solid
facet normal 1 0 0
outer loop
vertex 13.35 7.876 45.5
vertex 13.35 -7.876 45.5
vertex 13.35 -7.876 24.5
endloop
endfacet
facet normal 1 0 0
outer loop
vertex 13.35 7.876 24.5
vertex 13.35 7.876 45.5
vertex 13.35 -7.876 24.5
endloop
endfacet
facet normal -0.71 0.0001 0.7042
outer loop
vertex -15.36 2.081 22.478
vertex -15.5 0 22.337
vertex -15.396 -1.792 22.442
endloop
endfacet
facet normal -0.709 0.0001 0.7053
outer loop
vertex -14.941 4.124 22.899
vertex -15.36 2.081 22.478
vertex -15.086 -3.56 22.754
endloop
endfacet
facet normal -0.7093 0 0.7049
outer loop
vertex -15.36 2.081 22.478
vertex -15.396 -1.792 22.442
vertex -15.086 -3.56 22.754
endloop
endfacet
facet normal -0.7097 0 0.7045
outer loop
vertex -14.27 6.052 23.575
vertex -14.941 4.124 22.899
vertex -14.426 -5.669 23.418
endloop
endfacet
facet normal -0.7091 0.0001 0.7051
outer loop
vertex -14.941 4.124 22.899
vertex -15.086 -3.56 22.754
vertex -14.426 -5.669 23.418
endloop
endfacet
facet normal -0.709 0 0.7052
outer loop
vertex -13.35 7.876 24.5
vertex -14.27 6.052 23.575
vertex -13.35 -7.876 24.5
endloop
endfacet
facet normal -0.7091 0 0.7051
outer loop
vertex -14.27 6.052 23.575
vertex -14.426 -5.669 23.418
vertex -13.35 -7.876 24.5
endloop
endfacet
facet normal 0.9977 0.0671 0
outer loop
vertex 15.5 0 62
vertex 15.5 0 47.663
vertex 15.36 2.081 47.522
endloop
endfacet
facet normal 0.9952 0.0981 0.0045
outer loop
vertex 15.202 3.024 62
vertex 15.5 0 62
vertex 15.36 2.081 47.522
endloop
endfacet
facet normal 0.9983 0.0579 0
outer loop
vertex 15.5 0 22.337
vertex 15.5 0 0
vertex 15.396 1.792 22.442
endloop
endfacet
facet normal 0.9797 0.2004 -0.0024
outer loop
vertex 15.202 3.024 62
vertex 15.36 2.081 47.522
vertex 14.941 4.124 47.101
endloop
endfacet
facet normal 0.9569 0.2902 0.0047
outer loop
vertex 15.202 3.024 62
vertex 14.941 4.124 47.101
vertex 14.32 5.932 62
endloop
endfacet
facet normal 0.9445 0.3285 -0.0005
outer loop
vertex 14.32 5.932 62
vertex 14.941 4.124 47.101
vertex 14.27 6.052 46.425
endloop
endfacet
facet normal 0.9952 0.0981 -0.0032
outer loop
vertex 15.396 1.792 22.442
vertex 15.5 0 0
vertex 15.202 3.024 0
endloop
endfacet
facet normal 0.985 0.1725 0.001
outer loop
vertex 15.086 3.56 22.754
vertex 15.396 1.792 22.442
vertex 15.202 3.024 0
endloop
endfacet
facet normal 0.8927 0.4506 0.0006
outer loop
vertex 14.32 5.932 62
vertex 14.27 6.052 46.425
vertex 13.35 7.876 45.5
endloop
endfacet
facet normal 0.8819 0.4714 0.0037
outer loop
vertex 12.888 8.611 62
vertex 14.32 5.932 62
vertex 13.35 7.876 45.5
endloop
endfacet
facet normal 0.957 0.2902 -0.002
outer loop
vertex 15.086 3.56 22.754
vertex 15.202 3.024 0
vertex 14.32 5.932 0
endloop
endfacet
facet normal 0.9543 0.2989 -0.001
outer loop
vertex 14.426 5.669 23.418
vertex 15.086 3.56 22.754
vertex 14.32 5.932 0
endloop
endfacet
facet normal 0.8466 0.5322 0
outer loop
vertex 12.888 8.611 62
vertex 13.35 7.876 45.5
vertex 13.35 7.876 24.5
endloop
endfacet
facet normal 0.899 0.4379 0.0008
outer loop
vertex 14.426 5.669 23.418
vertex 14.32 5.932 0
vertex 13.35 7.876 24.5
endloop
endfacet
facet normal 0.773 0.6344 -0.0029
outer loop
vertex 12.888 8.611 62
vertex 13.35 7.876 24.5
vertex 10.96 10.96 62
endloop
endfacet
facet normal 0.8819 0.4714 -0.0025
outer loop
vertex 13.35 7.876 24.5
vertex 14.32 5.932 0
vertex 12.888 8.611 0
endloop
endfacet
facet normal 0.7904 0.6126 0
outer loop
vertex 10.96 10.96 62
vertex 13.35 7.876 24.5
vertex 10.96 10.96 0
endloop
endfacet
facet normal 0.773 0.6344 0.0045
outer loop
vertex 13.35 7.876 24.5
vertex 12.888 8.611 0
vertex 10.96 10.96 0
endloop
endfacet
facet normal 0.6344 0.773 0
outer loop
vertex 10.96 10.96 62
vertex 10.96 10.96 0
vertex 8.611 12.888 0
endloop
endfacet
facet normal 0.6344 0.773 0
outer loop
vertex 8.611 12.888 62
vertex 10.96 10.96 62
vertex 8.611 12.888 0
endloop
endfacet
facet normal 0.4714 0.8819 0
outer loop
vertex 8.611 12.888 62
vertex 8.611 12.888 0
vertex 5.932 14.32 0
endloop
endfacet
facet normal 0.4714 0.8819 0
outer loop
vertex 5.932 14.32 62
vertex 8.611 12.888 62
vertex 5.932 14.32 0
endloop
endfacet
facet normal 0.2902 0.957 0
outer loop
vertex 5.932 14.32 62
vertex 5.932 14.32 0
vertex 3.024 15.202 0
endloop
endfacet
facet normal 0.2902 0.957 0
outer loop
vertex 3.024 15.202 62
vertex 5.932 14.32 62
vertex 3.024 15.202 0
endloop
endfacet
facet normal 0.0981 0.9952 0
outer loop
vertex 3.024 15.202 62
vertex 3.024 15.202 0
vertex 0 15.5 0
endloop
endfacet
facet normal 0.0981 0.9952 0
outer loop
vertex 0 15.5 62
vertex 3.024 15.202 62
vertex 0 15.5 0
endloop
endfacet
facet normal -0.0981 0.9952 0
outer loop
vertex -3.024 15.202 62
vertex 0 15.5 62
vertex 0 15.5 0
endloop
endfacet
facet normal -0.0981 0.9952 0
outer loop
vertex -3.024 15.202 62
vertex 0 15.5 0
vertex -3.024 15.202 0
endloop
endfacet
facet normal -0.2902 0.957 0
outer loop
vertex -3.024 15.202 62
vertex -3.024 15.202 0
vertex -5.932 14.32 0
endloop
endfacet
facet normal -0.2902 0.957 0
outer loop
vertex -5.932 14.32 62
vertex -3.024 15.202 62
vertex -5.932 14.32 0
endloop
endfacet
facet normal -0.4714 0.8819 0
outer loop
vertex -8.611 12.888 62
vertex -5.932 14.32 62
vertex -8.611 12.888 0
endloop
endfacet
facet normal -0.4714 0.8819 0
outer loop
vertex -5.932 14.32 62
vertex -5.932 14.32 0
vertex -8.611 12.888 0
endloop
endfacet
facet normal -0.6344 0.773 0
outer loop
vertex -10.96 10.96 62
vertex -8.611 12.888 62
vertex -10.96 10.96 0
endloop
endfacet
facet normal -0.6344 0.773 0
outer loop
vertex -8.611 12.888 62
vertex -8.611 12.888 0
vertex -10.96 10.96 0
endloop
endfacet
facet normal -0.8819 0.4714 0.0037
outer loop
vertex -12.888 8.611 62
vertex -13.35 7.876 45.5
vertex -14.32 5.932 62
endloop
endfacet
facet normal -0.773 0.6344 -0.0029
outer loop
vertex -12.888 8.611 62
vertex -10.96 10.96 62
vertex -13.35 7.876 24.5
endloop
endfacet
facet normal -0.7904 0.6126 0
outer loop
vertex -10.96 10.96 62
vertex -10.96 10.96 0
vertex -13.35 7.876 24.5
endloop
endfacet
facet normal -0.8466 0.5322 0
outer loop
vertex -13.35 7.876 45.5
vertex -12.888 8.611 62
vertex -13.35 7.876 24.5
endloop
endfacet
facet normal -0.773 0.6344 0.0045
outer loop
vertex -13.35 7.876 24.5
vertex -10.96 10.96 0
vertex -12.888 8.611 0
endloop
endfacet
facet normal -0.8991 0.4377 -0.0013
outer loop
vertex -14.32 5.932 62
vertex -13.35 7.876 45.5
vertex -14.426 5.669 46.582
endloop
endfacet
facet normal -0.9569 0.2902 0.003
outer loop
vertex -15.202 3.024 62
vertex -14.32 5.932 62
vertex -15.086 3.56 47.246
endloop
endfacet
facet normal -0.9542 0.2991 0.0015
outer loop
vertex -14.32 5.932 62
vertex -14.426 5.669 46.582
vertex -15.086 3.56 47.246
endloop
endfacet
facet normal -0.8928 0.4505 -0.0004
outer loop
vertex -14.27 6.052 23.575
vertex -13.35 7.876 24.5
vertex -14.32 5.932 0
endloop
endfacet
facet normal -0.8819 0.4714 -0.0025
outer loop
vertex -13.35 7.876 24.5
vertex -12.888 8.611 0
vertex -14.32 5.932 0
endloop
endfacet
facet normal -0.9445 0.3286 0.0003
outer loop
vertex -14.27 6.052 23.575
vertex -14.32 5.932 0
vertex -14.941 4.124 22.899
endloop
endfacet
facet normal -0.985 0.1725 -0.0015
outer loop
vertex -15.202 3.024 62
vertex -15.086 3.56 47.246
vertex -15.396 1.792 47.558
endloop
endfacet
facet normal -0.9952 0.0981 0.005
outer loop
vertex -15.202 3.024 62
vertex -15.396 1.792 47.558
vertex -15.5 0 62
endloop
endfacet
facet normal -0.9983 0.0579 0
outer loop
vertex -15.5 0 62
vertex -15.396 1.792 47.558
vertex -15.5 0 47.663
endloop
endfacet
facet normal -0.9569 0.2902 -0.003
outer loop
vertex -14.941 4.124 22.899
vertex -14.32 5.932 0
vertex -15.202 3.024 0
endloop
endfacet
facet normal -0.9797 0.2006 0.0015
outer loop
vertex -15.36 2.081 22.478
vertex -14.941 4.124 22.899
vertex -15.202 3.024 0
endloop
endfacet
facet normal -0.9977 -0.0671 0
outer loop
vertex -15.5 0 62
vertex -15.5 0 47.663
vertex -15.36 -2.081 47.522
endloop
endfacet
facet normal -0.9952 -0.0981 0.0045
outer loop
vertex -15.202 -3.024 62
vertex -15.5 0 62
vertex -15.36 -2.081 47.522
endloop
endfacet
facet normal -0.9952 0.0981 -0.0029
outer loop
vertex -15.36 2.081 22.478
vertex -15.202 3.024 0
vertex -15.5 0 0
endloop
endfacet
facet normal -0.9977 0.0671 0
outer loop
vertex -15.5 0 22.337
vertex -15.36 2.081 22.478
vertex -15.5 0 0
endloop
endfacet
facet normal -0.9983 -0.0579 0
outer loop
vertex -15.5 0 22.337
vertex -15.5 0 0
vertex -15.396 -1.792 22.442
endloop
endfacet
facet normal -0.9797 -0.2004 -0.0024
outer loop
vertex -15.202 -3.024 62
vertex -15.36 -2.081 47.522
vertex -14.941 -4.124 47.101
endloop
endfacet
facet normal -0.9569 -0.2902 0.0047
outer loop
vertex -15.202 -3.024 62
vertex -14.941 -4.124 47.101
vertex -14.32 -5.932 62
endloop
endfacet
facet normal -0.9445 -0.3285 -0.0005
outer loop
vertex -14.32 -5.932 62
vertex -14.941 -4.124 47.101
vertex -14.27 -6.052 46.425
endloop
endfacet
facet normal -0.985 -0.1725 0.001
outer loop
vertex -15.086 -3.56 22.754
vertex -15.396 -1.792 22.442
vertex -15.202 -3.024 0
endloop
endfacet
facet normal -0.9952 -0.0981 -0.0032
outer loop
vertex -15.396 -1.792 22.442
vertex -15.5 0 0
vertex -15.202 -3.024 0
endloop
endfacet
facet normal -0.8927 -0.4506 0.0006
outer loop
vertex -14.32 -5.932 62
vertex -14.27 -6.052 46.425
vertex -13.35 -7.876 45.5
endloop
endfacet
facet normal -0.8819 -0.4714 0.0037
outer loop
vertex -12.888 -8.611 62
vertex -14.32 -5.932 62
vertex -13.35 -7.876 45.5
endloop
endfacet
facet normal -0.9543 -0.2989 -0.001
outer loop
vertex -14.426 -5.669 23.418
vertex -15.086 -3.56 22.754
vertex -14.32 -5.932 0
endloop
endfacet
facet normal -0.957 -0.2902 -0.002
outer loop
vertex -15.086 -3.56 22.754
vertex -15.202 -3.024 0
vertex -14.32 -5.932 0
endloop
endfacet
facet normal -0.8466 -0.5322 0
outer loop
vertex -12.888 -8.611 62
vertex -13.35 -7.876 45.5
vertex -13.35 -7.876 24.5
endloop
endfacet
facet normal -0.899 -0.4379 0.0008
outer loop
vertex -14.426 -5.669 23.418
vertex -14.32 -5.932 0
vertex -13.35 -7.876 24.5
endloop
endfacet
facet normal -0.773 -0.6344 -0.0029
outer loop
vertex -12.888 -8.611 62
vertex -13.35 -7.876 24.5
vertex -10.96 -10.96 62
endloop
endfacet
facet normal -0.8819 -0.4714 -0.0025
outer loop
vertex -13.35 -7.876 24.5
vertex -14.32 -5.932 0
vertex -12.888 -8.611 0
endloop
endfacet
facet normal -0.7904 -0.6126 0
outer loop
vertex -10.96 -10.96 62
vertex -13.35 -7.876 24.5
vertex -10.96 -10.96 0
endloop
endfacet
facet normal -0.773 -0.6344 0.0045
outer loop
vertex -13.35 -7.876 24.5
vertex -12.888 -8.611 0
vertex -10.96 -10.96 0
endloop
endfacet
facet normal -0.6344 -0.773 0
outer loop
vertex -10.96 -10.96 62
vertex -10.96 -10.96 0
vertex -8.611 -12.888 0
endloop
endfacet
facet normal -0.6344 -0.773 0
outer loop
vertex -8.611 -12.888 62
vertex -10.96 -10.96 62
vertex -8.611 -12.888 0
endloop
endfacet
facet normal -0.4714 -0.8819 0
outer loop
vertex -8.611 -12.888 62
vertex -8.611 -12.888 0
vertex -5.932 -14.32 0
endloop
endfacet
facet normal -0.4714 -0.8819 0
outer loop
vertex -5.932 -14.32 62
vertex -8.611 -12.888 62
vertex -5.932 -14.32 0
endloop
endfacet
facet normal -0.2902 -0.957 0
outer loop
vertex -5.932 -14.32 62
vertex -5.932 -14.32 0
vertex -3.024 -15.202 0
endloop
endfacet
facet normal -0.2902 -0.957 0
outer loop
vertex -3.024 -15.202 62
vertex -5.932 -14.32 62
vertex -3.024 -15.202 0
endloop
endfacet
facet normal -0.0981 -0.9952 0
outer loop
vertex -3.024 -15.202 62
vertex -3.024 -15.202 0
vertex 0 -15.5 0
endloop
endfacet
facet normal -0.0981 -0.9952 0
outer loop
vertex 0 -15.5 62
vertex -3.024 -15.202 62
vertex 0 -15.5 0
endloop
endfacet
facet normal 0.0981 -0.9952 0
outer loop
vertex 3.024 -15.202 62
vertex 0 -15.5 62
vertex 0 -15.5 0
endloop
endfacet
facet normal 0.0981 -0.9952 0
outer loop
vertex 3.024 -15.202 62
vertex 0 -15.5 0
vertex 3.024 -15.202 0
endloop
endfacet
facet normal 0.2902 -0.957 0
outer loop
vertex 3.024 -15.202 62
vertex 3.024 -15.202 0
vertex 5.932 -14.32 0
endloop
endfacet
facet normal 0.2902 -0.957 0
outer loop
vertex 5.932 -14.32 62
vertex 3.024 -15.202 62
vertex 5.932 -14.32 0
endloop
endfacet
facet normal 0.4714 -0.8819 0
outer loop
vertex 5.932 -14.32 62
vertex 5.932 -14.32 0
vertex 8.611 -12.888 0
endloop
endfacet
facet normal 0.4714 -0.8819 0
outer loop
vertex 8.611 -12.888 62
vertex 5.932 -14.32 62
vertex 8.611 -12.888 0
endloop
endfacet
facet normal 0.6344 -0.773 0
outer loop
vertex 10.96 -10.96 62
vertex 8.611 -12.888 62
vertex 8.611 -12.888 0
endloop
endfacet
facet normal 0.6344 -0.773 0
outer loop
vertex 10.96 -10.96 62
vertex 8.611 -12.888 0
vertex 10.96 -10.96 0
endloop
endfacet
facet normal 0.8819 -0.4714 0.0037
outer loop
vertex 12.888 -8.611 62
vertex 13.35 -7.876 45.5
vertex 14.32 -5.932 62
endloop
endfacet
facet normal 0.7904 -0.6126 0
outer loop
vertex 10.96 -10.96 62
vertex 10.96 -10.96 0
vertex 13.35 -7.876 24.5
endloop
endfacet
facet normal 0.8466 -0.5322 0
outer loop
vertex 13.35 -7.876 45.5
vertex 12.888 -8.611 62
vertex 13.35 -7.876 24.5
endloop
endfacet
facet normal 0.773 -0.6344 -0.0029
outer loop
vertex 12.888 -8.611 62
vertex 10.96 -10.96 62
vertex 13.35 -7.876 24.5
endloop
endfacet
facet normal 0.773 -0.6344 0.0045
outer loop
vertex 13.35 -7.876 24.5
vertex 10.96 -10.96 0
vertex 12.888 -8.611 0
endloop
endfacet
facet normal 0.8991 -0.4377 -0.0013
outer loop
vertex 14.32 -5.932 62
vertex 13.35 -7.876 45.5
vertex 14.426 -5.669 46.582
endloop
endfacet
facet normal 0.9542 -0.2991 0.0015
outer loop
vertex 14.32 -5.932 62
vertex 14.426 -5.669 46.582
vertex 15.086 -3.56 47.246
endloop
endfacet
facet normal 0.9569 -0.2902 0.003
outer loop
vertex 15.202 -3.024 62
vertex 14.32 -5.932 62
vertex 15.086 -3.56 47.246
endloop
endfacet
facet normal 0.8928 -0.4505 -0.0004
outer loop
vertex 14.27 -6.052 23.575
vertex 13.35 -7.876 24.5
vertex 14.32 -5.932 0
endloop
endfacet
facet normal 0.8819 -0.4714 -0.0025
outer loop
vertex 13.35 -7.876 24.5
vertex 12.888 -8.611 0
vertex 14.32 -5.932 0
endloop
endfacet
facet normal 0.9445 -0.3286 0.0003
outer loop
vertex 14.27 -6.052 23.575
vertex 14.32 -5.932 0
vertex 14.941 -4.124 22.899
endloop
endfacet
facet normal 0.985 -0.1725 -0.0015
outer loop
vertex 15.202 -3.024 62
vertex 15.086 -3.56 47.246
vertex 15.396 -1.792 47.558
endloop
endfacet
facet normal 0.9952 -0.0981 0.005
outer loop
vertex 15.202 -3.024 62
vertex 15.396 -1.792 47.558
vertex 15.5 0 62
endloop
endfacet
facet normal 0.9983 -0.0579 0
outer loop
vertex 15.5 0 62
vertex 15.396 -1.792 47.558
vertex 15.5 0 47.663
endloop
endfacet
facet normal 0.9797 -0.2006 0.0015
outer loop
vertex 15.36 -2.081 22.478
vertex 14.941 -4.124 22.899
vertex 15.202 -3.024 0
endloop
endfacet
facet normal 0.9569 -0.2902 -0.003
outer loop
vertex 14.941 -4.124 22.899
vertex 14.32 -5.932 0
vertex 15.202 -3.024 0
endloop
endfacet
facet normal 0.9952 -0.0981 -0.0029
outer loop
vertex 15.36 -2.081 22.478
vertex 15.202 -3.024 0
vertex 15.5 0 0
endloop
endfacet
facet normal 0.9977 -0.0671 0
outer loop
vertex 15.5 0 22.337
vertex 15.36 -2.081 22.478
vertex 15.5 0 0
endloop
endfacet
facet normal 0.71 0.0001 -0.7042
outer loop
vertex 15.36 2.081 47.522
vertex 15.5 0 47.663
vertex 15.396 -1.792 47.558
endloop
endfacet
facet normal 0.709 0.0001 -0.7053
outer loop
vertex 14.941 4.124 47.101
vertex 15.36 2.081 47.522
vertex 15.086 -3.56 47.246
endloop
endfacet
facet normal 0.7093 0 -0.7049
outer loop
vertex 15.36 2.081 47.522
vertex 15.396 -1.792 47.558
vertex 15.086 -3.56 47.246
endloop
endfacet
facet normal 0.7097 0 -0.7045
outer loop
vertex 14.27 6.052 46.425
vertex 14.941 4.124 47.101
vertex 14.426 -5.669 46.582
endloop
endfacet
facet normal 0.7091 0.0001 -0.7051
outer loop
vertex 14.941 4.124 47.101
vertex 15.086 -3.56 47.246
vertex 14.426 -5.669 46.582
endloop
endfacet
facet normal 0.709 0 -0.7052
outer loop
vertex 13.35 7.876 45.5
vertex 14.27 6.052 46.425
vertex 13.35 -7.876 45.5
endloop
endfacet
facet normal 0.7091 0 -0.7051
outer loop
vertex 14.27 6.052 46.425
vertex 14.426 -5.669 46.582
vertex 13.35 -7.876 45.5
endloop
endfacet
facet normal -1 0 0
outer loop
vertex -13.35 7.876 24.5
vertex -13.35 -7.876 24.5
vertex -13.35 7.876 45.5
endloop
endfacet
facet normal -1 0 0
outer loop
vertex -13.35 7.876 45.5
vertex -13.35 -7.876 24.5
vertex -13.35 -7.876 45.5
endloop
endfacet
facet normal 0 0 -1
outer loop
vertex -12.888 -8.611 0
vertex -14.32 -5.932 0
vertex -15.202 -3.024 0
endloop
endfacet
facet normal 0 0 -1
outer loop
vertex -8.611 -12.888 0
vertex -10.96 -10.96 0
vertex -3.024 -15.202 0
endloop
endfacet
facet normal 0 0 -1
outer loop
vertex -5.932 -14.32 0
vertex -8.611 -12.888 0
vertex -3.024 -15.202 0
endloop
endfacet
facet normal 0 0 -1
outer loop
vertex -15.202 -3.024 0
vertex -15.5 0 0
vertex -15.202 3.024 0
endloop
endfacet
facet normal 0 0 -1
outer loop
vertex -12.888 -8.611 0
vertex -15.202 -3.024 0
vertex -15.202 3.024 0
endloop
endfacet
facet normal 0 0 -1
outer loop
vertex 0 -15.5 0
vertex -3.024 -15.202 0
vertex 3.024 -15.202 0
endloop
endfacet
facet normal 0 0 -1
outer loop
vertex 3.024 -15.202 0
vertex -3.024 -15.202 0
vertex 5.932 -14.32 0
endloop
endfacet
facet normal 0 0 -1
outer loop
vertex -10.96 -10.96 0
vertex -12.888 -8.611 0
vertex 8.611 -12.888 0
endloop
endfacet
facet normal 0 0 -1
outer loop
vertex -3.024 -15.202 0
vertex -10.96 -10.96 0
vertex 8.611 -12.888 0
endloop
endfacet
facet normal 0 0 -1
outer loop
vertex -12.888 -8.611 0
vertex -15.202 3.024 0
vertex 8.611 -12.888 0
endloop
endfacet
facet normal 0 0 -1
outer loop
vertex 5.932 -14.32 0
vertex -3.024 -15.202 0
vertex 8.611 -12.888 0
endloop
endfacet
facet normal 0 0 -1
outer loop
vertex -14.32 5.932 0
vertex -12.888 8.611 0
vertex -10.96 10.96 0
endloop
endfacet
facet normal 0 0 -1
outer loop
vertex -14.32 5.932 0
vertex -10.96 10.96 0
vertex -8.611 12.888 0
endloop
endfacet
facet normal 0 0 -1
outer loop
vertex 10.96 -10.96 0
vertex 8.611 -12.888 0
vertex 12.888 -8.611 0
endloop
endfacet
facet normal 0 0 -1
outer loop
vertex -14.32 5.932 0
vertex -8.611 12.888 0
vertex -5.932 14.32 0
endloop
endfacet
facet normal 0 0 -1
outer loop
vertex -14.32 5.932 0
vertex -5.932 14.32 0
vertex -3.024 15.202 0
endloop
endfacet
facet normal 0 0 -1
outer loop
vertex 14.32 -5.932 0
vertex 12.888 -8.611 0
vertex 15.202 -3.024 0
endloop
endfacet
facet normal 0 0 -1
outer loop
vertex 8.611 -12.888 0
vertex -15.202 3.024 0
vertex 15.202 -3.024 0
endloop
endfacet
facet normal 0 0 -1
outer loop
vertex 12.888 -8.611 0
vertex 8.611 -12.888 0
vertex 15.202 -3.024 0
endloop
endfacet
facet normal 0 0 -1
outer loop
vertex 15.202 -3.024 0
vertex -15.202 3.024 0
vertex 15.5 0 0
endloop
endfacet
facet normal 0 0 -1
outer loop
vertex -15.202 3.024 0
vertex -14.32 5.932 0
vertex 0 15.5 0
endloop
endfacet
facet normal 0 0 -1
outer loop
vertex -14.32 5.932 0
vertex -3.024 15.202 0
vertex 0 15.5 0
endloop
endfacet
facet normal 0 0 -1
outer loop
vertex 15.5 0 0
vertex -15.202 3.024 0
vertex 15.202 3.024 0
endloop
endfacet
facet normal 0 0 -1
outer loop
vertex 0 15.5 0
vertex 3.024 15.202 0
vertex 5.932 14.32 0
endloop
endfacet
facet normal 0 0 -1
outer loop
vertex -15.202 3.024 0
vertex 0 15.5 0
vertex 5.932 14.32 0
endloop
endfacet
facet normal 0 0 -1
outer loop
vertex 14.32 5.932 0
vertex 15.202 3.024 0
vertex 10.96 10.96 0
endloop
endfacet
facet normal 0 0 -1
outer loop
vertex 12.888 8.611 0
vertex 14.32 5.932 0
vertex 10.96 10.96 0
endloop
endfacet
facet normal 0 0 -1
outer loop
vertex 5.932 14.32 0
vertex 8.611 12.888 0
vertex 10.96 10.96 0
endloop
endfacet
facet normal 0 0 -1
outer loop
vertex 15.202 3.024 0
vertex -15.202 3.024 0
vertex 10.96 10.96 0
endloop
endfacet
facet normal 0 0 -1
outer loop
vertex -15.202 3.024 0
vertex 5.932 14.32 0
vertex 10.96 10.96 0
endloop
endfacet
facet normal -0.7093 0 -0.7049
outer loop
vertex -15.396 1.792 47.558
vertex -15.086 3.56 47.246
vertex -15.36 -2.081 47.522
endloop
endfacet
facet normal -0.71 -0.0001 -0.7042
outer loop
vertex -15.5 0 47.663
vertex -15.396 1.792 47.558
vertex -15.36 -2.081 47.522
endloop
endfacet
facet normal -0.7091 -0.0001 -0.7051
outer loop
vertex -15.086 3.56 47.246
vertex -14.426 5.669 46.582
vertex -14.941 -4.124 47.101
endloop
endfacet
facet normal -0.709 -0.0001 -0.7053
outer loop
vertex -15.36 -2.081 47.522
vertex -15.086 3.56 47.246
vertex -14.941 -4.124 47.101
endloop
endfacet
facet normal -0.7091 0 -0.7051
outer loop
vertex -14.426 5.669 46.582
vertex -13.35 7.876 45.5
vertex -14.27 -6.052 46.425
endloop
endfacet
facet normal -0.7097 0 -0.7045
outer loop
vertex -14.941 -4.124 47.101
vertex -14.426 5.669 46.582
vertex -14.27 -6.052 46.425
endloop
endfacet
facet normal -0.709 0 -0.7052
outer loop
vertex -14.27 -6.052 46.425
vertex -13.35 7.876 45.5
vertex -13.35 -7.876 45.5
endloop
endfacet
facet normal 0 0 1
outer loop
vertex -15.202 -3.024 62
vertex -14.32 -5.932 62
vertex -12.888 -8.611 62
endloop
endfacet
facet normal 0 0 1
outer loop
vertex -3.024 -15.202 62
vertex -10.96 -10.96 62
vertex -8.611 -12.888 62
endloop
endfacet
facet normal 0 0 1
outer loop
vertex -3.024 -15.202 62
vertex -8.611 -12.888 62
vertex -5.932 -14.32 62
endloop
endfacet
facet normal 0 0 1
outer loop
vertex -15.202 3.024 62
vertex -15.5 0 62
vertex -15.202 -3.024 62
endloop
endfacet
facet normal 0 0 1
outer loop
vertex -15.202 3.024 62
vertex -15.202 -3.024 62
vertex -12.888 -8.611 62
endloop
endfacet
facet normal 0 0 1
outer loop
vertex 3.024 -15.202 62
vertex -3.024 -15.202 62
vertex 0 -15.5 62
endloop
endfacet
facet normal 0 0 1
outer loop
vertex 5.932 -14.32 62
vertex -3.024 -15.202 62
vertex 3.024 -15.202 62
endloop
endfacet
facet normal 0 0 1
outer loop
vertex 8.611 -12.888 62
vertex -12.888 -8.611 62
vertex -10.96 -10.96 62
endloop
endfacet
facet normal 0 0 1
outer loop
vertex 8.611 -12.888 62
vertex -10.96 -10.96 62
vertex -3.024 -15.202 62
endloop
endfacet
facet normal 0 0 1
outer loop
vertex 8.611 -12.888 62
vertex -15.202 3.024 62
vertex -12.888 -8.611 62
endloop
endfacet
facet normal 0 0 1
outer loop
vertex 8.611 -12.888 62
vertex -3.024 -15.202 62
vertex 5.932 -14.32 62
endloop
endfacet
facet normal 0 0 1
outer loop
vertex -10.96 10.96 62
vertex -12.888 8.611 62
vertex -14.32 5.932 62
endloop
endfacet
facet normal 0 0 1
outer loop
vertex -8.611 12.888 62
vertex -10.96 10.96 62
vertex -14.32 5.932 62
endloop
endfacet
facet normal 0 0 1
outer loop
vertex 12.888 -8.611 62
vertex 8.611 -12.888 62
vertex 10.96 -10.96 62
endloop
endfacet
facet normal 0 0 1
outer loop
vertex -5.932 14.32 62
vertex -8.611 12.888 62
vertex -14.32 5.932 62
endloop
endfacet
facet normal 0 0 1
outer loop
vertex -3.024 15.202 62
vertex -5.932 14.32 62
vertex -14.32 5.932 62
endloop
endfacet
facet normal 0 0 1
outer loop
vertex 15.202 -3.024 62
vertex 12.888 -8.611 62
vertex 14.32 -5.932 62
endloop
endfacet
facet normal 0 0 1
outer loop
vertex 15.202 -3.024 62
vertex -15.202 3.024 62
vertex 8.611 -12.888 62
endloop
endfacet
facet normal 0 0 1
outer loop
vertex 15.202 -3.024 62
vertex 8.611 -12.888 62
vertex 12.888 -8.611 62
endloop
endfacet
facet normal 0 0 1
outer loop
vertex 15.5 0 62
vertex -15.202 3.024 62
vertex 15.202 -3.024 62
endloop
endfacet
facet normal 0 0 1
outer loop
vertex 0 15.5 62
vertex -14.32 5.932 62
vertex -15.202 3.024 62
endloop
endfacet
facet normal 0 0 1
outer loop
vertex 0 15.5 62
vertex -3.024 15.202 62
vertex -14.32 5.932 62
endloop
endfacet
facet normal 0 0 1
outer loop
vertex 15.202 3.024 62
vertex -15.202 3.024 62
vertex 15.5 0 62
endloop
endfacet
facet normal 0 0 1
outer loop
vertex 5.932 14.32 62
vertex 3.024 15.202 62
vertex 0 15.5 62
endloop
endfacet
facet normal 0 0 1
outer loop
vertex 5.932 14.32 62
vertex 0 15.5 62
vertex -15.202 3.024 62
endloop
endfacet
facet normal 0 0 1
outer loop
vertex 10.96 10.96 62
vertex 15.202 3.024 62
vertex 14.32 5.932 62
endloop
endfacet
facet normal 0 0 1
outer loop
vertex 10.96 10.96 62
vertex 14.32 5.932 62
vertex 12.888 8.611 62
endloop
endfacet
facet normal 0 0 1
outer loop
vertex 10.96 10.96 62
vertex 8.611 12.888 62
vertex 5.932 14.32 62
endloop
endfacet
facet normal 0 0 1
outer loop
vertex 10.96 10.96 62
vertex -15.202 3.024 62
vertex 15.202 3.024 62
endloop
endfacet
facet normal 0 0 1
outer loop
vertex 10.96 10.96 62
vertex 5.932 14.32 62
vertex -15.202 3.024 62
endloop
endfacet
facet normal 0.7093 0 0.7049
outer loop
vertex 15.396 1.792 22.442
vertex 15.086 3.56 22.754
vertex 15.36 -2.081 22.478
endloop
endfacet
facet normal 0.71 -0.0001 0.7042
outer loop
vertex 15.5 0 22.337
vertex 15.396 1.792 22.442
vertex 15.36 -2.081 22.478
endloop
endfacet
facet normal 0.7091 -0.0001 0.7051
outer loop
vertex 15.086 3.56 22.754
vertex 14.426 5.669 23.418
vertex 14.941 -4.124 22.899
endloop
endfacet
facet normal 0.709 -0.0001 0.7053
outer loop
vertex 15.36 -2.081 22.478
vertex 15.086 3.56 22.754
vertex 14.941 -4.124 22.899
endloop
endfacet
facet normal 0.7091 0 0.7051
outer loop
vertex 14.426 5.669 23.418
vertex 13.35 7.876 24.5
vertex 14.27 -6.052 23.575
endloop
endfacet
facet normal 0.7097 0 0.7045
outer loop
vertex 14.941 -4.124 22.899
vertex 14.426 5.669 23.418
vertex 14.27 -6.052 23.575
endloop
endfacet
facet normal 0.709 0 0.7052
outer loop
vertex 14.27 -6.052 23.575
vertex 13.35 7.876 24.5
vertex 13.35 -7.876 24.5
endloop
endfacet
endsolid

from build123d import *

# Parameters (mm, degrees)
SKETCH1_R               = 15.5
BOSS_EXTRUDE1_DEPTH     = 62
CUT_EXTRUDE1_DEPTH      = 66.76093065
CUT_EXTRUDE1_DEPTH_BACK = 66.76093065


with BuildPart() as part:
    # Sketch1 → Boss-Extrude1 (new body)
    with BuildSketch(Plane.XY):
        Circle(SKETCH1_R)
    extrude(amount=BOSS_EXTRUDE1_DEPTH)

    # Sketch2 → Cut-Extrude1 (cut, two sides: drawn at the far end of the back side and taken through both)
    with BuildSketch(Plane(origin=(0, 0, 0), x_dir=(1, 0, 0), z_dir=(0, 1, 0)).offset(-CUT_EXTRUDE1_DEPTH_BACK)):
        Polygon((-15.5, -22.33712703), (-13.35, -24.5), (-13.35, -45.5), (-15.5, -47.66287297), align=None)
        Polygon((15.5, -47.66287297), (13.35, -45.5), (13.35, -24.5), (15.5, -22.33712703), align=None)
    extrude(amount=CUT_EXTRUDE1_DEPTH + CUT_EXTRUDE1_DEPTH_BACK, mode=Mode.SUBTRACT)


solid = part.part
